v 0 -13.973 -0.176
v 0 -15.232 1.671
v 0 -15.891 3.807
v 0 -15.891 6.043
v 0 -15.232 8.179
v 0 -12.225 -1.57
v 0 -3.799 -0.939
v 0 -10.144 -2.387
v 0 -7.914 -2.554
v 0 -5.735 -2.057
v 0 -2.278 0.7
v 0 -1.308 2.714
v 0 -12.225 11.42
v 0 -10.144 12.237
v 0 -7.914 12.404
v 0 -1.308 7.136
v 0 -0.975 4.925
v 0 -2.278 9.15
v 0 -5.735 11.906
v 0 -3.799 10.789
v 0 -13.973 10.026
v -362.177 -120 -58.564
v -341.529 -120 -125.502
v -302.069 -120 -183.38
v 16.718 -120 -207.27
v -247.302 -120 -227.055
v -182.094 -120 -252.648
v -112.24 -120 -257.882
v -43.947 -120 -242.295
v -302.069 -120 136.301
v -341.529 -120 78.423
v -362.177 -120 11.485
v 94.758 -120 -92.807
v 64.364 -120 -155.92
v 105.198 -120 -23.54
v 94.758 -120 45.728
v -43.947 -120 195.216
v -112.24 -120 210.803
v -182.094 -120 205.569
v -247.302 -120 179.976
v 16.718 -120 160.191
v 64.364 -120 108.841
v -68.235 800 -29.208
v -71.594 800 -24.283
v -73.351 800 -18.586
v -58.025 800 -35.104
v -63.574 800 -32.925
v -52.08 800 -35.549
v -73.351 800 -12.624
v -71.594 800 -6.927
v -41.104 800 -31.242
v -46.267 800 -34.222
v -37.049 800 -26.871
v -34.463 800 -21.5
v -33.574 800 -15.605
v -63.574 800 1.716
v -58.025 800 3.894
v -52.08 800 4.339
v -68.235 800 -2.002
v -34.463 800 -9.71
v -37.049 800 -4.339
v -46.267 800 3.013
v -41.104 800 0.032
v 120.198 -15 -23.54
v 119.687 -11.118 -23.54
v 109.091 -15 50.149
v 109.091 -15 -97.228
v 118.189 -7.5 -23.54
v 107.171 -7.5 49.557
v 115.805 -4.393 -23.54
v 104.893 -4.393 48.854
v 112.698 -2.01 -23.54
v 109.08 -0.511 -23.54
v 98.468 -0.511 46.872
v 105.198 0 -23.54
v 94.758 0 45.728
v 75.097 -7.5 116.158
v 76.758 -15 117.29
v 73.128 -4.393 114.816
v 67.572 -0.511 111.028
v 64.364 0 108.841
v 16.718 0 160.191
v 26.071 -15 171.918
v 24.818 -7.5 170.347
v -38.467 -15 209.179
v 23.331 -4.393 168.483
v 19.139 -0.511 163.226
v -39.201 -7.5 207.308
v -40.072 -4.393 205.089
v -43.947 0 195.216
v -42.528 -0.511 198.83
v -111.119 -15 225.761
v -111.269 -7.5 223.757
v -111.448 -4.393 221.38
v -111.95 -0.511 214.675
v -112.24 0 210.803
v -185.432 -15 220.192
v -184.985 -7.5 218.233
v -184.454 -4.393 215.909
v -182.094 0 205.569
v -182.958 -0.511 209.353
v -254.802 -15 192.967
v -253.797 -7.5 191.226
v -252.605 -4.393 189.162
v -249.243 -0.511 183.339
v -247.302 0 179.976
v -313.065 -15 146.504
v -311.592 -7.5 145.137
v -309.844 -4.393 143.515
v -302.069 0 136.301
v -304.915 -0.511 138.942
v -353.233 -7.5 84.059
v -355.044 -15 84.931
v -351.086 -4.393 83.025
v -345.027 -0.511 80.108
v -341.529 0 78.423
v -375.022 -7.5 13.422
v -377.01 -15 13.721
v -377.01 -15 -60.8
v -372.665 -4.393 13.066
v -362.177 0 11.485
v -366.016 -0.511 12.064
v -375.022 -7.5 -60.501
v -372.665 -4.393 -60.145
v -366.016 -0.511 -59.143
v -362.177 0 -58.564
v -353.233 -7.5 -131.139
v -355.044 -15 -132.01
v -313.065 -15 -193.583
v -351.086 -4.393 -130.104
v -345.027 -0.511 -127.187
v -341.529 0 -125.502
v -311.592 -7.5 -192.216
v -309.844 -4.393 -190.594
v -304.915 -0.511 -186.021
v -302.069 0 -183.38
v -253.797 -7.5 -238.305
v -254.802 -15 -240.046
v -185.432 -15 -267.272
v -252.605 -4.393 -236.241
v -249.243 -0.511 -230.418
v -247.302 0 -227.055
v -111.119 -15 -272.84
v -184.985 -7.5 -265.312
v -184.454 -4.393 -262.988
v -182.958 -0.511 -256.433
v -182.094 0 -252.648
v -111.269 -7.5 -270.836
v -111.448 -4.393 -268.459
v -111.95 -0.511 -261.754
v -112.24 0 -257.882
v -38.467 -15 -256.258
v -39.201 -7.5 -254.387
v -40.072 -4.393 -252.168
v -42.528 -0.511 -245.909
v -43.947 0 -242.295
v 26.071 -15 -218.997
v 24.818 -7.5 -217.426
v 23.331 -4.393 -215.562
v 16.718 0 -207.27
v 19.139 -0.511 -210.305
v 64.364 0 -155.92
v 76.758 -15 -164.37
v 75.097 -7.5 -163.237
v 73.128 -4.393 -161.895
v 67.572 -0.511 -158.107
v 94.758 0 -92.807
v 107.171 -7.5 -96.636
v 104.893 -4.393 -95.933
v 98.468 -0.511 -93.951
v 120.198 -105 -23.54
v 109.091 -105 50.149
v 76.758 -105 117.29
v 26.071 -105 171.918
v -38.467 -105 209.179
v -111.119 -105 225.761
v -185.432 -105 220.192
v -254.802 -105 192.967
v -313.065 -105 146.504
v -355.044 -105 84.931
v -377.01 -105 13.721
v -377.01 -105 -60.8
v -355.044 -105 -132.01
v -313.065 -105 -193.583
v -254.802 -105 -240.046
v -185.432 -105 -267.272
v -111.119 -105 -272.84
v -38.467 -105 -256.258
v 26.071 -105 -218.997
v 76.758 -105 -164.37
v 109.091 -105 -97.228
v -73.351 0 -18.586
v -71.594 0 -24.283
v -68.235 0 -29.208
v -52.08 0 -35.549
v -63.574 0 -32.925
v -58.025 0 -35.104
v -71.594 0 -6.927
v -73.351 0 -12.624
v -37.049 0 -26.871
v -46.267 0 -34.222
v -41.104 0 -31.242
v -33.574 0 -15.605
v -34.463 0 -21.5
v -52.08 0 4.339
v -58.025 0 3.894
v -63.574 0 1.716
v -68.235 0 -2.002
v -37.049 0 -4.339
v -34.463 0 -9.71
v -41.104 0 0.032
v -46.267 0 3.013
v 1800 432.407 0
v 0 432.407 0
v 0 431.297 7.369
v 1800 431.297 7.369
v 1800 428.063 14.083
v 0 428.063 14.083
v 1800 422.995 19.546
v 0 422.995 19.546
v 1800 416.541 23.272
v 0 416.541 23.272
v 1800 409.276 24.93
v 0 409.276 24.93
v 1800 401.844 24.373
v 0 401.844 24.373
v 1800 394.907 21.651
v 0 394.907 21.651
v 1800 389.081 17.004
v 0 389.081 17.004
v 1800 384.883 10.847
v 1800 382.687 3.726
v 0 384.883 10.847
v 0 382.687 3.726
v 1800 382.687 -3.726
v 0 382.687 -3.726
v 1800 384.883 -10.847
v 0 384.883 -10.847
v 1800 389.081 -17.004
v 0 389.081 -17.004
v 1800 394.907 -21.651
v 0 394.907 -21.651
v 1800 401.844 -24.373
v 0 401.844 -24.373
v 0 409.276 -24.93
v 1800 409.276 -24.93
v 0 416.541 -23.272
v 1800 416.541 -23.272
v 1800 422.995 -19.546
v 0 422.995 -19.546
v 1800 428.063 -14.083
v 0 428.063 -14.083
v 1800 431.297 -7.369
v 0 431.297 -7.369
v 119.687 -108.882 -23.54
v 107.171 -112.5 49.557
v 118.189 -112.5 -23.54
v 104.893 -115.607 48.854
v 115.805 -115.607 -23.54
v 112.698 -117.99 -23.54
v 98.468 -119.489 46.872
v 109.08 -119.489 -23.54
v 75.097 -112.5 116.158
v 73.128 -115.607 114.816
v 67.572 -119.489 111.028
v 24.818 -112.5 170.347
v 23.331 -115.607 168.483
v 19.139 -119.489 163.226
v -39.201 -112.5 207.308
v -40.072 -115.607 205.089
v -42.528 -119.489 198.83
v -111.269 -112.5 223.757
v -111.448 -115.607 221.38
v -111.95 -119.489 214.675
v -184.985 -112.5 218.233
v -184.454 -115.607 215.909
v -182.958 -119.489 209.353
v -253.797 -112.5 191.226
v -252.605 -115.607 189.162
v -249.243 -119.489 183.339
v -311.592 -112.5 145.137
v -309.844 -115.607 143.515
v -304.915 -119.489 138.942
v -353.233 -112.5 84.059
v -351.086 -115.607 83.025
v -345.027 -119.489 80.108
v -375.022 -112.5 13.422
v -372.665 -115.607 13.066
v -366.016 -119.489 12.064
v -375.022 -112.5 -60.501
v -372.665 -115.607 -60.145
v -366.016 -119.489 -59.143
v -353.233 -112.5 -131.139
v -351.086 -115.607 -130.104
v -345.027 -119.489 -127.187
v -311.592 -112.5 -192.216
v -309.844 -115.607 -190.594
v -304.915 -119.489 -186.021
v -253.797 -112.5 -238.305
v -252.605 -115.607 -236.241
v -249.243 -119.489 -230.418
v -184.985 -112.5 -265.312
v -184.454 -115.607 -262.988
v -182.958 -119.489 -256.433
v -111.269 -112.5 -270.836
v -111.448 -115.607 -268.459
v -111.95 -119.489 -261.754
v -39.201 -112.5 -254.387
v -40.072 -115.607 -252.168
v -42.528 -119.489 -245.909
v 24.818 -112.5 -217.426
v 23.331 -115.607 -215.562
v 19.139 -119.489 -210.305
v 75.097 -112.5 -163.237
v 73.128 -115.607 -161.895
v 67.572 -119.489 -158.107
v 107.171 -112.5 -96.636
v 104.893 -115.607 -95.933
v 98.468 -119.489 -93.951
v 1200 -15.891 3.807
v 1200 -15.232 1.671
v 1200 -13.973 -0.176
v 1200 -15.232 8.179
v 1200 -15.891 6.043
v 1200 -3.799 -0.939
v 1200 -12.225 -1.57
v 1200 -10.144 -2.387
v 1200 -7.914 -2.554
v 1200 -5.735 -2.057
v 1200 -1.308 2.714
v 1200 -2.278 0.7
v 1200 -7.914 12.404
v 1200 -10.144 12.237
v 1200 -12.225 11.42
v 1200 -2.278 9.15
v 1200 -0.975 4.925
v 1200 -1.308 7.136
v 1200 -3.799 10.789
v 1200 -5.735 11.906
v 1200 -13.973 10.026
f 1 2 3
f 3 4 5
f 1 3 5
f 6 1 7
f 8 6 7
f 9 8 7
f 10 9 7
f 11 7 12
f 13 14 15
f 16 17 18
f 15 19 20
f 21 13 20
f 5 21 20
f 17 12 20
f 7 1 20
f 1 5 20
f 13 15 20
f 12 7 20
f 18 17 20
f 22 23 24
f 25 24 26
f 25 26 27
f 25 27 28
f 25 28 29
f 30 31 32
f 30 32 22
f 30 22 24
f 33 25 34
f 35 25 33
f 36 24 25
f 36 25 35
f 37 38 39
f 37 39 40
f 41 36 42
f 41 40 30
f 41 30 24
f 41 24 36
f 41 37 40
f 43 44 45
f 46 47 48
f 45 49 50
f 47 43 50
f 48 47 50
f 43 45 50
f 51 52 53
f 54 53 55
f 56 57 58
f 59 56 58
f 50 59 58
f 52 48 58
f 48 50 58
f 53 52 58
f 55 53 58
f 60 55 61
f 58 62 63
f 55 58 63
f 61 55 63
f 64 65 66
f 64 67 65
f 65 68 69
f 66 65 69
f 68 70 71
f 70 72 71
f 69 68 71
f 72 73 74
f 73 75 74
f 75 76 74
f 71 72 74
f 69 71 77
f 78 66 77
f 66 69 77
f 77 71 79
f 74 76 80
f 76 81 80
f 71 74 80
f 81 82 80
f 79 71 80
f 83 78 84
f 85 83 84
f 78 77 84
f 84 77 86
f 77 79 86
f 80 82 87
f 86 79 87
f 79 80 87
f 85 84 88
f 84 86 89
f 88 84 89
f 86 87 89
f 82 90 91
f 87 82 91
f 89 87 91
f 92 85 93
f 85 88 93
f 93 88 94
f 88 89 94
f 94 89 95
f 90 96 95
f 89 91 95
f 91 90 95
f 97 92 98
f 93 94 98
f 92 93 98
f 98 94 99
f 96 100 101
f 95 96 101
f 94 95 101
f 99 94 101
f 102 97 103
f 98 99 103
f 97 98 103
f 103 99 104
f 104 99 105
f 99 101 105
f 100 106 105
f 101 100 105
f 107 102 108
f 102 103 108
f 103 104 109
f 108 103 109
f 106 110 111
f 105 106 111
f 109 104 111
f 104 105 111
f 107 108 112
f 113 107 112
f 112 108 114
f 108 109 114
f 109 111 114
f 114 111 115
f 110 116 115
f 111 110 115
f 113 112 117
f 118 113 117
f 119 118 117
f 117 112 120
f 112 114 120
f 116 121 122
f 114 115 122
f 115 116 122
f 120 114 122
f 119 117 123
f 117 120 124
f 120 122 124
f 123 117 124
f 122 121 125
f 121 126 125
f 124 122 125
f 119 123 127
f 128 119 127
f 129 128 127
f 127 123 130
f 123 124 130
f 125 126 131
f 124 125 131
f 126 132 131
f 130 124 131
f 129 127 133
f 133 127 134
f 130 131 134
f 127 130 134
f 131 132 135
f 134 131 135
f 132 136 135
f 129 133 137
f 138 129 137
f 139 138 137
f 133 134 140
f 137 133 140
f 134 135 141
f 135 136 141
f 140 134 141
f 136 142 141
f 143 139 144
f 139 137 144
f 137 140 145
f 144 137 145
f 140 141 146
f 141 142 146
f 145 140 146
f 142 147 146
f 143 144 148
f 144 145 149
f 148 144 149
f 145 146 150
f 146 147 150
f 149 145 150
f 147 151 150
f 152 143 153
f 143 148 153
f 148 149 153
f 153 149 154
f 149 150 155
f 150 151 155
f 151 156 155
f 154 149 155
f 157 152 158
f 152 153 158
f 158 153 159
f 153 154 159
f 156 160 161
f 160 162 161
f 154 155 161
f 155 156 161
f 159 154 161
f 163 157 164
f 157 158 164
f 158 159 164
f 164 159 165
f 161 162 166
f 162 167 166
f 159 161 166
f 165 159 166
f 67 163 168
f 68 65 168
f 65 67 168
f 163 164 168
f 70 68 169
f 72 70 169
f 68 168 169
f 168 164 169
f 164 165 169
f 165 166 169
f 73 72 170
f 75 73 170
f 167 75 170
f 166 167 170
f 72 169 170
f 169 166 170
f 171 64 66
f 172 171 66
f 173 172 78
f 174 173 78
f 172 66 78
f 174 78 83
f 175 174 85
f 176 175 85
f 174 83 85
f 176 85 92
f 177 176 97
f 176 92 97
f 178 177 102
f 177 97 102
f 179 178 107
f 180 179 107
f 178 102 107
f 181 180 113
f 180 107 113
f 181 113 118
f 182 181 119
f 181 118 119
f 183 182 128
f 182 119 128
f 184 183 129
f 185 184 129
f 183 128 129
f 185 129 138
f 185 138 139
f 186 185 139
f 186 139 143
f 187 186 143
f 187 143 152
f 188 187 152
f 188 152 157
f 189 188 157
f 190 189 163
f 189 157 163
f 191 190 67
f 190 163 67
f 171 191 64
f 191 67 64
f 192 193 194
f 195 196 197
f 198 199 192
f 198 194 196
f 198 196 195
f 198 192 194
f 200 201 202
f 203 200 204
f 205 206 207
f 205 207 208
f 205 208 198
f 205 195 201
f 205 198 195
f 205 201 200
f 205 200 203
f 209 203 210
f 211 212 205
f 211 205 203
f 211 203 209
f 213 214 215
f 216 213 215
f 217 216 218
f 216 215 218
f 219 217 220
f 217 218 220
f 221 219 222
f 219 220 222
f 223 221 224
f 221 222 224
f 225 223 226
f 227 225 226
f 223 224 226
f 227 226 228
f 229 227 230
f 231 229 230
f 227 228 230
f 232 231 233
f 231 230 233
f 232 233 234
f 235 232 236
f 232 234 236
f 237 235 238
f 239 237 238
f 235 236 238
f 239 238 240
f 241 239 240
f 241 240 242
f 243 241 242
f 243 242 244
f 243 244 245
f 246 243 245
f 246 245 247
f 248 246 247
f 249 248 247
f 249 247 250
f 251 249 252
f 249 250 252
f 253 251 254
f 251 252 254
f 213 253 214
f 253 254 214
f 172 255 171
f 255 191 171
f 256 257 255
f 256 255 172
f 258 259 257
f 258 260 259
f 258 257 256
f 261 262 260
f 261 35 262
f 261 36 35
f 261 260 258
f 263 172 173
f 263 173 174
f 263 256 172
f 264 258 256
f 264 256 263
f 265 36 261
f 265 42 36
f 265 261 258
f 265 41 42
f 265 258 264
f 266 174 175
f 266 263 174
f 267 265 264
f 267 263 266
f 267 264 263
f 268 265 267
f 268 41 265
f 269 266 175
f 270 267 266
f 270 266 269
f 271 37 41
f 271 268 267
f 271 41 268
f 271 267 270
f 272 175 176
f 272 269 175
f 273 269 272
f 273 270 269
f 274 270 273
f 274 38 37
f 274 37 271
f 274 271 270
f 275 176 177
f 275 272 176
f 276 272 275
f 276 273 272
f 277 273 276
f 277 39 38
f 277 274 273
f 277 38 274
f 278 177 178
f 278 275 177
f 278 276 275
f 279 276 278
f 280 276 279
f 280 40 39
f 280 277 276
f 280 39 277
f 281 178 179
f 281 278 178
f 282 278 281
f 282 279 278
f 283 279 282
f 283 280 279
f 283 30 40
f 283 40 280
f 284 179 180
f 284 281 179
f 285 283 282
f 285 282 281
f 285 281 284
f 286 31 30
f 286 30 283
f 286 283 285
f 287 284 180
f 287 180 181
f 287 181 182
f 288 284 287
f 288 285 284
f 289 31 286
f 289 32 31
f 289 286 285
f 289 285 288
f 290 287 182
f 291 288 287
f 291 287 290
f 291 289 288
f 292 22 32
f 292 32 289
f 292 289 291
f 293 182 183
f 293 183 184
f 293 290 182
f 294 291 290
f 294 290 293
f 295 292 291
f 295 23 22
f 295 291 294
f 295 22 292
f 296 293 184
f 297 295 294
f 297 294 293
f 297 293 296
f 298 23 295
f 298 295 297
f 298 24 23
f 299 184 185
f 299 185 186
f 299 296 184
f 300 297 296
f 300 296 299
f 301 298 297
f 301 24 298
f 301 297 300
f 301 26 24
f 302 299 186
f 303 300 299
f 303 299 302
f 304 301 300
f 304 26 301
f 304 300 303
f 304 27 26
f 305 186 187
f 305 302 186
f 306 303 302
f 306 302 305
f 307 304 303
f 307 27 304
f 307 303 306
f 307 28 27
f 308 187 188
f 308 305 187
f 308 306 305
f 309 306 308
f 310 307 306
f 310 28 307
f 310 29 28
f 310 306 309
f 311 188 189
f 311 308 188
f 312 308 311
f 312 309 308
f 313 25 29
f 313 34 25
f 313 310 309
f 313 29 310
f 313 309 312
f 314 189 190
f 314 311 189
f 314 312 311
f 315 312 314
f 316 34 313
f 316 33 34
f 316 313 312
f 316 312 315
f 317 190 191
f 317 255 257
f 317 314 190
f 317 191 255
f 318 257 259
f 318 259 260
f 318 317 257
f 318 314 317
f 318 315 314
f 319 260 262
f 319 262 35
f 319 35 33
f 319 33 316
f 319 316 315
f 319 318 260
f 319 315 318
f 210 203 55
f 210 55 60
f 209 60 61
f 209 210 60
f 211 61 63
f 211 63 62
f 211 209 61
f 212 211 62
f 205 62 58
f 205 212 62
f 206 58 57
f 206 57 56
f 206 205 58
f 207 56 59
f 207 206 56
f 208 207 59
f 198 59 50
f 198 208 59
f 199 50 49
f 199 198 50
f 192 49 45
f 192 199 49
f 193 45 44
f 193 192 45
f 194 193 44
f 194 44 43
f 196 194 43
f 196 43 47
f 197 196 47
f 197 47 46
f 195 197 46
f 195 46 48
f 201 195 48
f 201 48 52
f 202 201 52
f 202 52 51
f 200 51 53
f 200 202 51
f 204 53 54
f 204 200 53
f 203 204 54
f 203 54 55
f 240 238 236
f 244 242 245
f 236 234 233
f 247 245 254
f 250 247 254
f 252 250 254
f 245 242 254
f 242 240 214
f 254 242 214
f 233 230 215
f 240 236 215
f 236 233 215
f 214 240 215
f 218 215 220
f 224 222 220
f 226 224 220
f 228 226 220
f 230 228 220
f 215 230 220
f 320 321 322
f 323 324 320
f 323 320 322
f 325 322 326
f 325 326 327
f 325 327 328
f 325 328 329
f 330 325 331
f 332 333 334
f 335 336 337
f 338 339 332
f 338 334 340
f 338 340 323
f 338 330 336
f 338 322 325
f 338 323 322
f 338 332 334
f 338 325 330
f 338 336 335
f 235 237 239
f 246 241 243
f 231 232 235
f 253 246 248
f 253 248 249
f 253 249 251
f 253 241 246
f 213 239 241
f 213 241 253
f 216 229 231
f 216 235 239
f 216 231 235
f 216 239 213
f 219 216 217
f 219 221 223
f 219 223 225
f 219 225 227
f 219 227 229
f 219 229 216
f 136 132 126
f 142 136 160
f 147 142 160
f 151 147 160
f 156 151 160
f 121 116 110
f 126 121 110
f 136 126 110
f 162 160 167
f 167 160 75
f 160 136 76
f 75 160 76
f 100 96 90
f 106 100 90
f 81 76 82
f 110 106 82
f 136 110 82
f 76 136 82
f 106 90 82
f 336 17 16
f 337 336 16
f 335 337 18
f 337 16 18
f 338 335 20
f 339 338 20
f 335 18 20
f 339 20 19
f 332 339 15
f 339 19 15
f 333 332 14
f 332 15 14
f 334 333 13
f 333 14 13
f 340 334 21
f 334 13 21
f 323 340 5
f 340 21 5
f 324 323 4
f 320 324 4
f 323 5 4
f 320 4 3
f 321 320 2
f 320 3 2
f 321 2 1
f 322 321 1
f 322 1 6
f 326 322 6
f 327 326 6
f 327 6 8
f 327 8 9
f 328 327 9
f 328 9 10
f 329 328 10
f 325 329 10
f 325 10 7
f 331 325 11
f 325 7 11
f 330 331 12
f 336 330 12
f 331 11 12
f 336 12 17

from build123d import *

# Parameters (mm, degrees)
F0_R     = 250
F1_DEPTH = 120
F2_R     = 15
F3_R     = 20
F4_DEPTH = 800
F5_R     = 7.5
F6_DEPTH = 1200
F7_R     = 25
F8_DEPTH = 1800


with BuildPart() as f1:
    # F0 (on Front) → F1 (new body)
    with BuildSketch(Plane.XZ):
        with Locations((-129.801795, -23.539526)):
            Circle(F0_R)
    extrude(amount=F1_DEPTH)

    # F2
    f2_edges = [f1.edges().sort_by_distance(p)[0] for p in [
        (-379.801795, 0, -23.539526),
        (120.198205, -60, -23.539526),
        (-379.801795, -120, -23.539526),
    ]]
    fillet(f2_edges, radius=F2_R)


with BuildPart() as f4:
    # F3 (on Front) → F4 (new body)
    with BuildSketch(Plane.XZ):
        with Locations((-53.574227, -15.604964)):
            Circle(F3_R)
    extrude(amount=-F4_DEPTH)


with BuildPart() as f6:
    # F5 (on Right) → F6 (new body)
    with BuildSketch(Plane.YZ):
        with Locations((-8.4748, 4.92485)):
            Circle(F5_R)
    extrude(amount=F6_DEPTH)


with BuildPart() as f8:
    # F7 (on Right) → F8 (new body)
    with BuildSketch(Plane.YZ):
        with Locations((407.407492, 0)):
            Circle(F7_R)
    extrude(amount=F8_DEPTH)


solid = Compound([f1.part, f4.part, f6.part, f8.part])
